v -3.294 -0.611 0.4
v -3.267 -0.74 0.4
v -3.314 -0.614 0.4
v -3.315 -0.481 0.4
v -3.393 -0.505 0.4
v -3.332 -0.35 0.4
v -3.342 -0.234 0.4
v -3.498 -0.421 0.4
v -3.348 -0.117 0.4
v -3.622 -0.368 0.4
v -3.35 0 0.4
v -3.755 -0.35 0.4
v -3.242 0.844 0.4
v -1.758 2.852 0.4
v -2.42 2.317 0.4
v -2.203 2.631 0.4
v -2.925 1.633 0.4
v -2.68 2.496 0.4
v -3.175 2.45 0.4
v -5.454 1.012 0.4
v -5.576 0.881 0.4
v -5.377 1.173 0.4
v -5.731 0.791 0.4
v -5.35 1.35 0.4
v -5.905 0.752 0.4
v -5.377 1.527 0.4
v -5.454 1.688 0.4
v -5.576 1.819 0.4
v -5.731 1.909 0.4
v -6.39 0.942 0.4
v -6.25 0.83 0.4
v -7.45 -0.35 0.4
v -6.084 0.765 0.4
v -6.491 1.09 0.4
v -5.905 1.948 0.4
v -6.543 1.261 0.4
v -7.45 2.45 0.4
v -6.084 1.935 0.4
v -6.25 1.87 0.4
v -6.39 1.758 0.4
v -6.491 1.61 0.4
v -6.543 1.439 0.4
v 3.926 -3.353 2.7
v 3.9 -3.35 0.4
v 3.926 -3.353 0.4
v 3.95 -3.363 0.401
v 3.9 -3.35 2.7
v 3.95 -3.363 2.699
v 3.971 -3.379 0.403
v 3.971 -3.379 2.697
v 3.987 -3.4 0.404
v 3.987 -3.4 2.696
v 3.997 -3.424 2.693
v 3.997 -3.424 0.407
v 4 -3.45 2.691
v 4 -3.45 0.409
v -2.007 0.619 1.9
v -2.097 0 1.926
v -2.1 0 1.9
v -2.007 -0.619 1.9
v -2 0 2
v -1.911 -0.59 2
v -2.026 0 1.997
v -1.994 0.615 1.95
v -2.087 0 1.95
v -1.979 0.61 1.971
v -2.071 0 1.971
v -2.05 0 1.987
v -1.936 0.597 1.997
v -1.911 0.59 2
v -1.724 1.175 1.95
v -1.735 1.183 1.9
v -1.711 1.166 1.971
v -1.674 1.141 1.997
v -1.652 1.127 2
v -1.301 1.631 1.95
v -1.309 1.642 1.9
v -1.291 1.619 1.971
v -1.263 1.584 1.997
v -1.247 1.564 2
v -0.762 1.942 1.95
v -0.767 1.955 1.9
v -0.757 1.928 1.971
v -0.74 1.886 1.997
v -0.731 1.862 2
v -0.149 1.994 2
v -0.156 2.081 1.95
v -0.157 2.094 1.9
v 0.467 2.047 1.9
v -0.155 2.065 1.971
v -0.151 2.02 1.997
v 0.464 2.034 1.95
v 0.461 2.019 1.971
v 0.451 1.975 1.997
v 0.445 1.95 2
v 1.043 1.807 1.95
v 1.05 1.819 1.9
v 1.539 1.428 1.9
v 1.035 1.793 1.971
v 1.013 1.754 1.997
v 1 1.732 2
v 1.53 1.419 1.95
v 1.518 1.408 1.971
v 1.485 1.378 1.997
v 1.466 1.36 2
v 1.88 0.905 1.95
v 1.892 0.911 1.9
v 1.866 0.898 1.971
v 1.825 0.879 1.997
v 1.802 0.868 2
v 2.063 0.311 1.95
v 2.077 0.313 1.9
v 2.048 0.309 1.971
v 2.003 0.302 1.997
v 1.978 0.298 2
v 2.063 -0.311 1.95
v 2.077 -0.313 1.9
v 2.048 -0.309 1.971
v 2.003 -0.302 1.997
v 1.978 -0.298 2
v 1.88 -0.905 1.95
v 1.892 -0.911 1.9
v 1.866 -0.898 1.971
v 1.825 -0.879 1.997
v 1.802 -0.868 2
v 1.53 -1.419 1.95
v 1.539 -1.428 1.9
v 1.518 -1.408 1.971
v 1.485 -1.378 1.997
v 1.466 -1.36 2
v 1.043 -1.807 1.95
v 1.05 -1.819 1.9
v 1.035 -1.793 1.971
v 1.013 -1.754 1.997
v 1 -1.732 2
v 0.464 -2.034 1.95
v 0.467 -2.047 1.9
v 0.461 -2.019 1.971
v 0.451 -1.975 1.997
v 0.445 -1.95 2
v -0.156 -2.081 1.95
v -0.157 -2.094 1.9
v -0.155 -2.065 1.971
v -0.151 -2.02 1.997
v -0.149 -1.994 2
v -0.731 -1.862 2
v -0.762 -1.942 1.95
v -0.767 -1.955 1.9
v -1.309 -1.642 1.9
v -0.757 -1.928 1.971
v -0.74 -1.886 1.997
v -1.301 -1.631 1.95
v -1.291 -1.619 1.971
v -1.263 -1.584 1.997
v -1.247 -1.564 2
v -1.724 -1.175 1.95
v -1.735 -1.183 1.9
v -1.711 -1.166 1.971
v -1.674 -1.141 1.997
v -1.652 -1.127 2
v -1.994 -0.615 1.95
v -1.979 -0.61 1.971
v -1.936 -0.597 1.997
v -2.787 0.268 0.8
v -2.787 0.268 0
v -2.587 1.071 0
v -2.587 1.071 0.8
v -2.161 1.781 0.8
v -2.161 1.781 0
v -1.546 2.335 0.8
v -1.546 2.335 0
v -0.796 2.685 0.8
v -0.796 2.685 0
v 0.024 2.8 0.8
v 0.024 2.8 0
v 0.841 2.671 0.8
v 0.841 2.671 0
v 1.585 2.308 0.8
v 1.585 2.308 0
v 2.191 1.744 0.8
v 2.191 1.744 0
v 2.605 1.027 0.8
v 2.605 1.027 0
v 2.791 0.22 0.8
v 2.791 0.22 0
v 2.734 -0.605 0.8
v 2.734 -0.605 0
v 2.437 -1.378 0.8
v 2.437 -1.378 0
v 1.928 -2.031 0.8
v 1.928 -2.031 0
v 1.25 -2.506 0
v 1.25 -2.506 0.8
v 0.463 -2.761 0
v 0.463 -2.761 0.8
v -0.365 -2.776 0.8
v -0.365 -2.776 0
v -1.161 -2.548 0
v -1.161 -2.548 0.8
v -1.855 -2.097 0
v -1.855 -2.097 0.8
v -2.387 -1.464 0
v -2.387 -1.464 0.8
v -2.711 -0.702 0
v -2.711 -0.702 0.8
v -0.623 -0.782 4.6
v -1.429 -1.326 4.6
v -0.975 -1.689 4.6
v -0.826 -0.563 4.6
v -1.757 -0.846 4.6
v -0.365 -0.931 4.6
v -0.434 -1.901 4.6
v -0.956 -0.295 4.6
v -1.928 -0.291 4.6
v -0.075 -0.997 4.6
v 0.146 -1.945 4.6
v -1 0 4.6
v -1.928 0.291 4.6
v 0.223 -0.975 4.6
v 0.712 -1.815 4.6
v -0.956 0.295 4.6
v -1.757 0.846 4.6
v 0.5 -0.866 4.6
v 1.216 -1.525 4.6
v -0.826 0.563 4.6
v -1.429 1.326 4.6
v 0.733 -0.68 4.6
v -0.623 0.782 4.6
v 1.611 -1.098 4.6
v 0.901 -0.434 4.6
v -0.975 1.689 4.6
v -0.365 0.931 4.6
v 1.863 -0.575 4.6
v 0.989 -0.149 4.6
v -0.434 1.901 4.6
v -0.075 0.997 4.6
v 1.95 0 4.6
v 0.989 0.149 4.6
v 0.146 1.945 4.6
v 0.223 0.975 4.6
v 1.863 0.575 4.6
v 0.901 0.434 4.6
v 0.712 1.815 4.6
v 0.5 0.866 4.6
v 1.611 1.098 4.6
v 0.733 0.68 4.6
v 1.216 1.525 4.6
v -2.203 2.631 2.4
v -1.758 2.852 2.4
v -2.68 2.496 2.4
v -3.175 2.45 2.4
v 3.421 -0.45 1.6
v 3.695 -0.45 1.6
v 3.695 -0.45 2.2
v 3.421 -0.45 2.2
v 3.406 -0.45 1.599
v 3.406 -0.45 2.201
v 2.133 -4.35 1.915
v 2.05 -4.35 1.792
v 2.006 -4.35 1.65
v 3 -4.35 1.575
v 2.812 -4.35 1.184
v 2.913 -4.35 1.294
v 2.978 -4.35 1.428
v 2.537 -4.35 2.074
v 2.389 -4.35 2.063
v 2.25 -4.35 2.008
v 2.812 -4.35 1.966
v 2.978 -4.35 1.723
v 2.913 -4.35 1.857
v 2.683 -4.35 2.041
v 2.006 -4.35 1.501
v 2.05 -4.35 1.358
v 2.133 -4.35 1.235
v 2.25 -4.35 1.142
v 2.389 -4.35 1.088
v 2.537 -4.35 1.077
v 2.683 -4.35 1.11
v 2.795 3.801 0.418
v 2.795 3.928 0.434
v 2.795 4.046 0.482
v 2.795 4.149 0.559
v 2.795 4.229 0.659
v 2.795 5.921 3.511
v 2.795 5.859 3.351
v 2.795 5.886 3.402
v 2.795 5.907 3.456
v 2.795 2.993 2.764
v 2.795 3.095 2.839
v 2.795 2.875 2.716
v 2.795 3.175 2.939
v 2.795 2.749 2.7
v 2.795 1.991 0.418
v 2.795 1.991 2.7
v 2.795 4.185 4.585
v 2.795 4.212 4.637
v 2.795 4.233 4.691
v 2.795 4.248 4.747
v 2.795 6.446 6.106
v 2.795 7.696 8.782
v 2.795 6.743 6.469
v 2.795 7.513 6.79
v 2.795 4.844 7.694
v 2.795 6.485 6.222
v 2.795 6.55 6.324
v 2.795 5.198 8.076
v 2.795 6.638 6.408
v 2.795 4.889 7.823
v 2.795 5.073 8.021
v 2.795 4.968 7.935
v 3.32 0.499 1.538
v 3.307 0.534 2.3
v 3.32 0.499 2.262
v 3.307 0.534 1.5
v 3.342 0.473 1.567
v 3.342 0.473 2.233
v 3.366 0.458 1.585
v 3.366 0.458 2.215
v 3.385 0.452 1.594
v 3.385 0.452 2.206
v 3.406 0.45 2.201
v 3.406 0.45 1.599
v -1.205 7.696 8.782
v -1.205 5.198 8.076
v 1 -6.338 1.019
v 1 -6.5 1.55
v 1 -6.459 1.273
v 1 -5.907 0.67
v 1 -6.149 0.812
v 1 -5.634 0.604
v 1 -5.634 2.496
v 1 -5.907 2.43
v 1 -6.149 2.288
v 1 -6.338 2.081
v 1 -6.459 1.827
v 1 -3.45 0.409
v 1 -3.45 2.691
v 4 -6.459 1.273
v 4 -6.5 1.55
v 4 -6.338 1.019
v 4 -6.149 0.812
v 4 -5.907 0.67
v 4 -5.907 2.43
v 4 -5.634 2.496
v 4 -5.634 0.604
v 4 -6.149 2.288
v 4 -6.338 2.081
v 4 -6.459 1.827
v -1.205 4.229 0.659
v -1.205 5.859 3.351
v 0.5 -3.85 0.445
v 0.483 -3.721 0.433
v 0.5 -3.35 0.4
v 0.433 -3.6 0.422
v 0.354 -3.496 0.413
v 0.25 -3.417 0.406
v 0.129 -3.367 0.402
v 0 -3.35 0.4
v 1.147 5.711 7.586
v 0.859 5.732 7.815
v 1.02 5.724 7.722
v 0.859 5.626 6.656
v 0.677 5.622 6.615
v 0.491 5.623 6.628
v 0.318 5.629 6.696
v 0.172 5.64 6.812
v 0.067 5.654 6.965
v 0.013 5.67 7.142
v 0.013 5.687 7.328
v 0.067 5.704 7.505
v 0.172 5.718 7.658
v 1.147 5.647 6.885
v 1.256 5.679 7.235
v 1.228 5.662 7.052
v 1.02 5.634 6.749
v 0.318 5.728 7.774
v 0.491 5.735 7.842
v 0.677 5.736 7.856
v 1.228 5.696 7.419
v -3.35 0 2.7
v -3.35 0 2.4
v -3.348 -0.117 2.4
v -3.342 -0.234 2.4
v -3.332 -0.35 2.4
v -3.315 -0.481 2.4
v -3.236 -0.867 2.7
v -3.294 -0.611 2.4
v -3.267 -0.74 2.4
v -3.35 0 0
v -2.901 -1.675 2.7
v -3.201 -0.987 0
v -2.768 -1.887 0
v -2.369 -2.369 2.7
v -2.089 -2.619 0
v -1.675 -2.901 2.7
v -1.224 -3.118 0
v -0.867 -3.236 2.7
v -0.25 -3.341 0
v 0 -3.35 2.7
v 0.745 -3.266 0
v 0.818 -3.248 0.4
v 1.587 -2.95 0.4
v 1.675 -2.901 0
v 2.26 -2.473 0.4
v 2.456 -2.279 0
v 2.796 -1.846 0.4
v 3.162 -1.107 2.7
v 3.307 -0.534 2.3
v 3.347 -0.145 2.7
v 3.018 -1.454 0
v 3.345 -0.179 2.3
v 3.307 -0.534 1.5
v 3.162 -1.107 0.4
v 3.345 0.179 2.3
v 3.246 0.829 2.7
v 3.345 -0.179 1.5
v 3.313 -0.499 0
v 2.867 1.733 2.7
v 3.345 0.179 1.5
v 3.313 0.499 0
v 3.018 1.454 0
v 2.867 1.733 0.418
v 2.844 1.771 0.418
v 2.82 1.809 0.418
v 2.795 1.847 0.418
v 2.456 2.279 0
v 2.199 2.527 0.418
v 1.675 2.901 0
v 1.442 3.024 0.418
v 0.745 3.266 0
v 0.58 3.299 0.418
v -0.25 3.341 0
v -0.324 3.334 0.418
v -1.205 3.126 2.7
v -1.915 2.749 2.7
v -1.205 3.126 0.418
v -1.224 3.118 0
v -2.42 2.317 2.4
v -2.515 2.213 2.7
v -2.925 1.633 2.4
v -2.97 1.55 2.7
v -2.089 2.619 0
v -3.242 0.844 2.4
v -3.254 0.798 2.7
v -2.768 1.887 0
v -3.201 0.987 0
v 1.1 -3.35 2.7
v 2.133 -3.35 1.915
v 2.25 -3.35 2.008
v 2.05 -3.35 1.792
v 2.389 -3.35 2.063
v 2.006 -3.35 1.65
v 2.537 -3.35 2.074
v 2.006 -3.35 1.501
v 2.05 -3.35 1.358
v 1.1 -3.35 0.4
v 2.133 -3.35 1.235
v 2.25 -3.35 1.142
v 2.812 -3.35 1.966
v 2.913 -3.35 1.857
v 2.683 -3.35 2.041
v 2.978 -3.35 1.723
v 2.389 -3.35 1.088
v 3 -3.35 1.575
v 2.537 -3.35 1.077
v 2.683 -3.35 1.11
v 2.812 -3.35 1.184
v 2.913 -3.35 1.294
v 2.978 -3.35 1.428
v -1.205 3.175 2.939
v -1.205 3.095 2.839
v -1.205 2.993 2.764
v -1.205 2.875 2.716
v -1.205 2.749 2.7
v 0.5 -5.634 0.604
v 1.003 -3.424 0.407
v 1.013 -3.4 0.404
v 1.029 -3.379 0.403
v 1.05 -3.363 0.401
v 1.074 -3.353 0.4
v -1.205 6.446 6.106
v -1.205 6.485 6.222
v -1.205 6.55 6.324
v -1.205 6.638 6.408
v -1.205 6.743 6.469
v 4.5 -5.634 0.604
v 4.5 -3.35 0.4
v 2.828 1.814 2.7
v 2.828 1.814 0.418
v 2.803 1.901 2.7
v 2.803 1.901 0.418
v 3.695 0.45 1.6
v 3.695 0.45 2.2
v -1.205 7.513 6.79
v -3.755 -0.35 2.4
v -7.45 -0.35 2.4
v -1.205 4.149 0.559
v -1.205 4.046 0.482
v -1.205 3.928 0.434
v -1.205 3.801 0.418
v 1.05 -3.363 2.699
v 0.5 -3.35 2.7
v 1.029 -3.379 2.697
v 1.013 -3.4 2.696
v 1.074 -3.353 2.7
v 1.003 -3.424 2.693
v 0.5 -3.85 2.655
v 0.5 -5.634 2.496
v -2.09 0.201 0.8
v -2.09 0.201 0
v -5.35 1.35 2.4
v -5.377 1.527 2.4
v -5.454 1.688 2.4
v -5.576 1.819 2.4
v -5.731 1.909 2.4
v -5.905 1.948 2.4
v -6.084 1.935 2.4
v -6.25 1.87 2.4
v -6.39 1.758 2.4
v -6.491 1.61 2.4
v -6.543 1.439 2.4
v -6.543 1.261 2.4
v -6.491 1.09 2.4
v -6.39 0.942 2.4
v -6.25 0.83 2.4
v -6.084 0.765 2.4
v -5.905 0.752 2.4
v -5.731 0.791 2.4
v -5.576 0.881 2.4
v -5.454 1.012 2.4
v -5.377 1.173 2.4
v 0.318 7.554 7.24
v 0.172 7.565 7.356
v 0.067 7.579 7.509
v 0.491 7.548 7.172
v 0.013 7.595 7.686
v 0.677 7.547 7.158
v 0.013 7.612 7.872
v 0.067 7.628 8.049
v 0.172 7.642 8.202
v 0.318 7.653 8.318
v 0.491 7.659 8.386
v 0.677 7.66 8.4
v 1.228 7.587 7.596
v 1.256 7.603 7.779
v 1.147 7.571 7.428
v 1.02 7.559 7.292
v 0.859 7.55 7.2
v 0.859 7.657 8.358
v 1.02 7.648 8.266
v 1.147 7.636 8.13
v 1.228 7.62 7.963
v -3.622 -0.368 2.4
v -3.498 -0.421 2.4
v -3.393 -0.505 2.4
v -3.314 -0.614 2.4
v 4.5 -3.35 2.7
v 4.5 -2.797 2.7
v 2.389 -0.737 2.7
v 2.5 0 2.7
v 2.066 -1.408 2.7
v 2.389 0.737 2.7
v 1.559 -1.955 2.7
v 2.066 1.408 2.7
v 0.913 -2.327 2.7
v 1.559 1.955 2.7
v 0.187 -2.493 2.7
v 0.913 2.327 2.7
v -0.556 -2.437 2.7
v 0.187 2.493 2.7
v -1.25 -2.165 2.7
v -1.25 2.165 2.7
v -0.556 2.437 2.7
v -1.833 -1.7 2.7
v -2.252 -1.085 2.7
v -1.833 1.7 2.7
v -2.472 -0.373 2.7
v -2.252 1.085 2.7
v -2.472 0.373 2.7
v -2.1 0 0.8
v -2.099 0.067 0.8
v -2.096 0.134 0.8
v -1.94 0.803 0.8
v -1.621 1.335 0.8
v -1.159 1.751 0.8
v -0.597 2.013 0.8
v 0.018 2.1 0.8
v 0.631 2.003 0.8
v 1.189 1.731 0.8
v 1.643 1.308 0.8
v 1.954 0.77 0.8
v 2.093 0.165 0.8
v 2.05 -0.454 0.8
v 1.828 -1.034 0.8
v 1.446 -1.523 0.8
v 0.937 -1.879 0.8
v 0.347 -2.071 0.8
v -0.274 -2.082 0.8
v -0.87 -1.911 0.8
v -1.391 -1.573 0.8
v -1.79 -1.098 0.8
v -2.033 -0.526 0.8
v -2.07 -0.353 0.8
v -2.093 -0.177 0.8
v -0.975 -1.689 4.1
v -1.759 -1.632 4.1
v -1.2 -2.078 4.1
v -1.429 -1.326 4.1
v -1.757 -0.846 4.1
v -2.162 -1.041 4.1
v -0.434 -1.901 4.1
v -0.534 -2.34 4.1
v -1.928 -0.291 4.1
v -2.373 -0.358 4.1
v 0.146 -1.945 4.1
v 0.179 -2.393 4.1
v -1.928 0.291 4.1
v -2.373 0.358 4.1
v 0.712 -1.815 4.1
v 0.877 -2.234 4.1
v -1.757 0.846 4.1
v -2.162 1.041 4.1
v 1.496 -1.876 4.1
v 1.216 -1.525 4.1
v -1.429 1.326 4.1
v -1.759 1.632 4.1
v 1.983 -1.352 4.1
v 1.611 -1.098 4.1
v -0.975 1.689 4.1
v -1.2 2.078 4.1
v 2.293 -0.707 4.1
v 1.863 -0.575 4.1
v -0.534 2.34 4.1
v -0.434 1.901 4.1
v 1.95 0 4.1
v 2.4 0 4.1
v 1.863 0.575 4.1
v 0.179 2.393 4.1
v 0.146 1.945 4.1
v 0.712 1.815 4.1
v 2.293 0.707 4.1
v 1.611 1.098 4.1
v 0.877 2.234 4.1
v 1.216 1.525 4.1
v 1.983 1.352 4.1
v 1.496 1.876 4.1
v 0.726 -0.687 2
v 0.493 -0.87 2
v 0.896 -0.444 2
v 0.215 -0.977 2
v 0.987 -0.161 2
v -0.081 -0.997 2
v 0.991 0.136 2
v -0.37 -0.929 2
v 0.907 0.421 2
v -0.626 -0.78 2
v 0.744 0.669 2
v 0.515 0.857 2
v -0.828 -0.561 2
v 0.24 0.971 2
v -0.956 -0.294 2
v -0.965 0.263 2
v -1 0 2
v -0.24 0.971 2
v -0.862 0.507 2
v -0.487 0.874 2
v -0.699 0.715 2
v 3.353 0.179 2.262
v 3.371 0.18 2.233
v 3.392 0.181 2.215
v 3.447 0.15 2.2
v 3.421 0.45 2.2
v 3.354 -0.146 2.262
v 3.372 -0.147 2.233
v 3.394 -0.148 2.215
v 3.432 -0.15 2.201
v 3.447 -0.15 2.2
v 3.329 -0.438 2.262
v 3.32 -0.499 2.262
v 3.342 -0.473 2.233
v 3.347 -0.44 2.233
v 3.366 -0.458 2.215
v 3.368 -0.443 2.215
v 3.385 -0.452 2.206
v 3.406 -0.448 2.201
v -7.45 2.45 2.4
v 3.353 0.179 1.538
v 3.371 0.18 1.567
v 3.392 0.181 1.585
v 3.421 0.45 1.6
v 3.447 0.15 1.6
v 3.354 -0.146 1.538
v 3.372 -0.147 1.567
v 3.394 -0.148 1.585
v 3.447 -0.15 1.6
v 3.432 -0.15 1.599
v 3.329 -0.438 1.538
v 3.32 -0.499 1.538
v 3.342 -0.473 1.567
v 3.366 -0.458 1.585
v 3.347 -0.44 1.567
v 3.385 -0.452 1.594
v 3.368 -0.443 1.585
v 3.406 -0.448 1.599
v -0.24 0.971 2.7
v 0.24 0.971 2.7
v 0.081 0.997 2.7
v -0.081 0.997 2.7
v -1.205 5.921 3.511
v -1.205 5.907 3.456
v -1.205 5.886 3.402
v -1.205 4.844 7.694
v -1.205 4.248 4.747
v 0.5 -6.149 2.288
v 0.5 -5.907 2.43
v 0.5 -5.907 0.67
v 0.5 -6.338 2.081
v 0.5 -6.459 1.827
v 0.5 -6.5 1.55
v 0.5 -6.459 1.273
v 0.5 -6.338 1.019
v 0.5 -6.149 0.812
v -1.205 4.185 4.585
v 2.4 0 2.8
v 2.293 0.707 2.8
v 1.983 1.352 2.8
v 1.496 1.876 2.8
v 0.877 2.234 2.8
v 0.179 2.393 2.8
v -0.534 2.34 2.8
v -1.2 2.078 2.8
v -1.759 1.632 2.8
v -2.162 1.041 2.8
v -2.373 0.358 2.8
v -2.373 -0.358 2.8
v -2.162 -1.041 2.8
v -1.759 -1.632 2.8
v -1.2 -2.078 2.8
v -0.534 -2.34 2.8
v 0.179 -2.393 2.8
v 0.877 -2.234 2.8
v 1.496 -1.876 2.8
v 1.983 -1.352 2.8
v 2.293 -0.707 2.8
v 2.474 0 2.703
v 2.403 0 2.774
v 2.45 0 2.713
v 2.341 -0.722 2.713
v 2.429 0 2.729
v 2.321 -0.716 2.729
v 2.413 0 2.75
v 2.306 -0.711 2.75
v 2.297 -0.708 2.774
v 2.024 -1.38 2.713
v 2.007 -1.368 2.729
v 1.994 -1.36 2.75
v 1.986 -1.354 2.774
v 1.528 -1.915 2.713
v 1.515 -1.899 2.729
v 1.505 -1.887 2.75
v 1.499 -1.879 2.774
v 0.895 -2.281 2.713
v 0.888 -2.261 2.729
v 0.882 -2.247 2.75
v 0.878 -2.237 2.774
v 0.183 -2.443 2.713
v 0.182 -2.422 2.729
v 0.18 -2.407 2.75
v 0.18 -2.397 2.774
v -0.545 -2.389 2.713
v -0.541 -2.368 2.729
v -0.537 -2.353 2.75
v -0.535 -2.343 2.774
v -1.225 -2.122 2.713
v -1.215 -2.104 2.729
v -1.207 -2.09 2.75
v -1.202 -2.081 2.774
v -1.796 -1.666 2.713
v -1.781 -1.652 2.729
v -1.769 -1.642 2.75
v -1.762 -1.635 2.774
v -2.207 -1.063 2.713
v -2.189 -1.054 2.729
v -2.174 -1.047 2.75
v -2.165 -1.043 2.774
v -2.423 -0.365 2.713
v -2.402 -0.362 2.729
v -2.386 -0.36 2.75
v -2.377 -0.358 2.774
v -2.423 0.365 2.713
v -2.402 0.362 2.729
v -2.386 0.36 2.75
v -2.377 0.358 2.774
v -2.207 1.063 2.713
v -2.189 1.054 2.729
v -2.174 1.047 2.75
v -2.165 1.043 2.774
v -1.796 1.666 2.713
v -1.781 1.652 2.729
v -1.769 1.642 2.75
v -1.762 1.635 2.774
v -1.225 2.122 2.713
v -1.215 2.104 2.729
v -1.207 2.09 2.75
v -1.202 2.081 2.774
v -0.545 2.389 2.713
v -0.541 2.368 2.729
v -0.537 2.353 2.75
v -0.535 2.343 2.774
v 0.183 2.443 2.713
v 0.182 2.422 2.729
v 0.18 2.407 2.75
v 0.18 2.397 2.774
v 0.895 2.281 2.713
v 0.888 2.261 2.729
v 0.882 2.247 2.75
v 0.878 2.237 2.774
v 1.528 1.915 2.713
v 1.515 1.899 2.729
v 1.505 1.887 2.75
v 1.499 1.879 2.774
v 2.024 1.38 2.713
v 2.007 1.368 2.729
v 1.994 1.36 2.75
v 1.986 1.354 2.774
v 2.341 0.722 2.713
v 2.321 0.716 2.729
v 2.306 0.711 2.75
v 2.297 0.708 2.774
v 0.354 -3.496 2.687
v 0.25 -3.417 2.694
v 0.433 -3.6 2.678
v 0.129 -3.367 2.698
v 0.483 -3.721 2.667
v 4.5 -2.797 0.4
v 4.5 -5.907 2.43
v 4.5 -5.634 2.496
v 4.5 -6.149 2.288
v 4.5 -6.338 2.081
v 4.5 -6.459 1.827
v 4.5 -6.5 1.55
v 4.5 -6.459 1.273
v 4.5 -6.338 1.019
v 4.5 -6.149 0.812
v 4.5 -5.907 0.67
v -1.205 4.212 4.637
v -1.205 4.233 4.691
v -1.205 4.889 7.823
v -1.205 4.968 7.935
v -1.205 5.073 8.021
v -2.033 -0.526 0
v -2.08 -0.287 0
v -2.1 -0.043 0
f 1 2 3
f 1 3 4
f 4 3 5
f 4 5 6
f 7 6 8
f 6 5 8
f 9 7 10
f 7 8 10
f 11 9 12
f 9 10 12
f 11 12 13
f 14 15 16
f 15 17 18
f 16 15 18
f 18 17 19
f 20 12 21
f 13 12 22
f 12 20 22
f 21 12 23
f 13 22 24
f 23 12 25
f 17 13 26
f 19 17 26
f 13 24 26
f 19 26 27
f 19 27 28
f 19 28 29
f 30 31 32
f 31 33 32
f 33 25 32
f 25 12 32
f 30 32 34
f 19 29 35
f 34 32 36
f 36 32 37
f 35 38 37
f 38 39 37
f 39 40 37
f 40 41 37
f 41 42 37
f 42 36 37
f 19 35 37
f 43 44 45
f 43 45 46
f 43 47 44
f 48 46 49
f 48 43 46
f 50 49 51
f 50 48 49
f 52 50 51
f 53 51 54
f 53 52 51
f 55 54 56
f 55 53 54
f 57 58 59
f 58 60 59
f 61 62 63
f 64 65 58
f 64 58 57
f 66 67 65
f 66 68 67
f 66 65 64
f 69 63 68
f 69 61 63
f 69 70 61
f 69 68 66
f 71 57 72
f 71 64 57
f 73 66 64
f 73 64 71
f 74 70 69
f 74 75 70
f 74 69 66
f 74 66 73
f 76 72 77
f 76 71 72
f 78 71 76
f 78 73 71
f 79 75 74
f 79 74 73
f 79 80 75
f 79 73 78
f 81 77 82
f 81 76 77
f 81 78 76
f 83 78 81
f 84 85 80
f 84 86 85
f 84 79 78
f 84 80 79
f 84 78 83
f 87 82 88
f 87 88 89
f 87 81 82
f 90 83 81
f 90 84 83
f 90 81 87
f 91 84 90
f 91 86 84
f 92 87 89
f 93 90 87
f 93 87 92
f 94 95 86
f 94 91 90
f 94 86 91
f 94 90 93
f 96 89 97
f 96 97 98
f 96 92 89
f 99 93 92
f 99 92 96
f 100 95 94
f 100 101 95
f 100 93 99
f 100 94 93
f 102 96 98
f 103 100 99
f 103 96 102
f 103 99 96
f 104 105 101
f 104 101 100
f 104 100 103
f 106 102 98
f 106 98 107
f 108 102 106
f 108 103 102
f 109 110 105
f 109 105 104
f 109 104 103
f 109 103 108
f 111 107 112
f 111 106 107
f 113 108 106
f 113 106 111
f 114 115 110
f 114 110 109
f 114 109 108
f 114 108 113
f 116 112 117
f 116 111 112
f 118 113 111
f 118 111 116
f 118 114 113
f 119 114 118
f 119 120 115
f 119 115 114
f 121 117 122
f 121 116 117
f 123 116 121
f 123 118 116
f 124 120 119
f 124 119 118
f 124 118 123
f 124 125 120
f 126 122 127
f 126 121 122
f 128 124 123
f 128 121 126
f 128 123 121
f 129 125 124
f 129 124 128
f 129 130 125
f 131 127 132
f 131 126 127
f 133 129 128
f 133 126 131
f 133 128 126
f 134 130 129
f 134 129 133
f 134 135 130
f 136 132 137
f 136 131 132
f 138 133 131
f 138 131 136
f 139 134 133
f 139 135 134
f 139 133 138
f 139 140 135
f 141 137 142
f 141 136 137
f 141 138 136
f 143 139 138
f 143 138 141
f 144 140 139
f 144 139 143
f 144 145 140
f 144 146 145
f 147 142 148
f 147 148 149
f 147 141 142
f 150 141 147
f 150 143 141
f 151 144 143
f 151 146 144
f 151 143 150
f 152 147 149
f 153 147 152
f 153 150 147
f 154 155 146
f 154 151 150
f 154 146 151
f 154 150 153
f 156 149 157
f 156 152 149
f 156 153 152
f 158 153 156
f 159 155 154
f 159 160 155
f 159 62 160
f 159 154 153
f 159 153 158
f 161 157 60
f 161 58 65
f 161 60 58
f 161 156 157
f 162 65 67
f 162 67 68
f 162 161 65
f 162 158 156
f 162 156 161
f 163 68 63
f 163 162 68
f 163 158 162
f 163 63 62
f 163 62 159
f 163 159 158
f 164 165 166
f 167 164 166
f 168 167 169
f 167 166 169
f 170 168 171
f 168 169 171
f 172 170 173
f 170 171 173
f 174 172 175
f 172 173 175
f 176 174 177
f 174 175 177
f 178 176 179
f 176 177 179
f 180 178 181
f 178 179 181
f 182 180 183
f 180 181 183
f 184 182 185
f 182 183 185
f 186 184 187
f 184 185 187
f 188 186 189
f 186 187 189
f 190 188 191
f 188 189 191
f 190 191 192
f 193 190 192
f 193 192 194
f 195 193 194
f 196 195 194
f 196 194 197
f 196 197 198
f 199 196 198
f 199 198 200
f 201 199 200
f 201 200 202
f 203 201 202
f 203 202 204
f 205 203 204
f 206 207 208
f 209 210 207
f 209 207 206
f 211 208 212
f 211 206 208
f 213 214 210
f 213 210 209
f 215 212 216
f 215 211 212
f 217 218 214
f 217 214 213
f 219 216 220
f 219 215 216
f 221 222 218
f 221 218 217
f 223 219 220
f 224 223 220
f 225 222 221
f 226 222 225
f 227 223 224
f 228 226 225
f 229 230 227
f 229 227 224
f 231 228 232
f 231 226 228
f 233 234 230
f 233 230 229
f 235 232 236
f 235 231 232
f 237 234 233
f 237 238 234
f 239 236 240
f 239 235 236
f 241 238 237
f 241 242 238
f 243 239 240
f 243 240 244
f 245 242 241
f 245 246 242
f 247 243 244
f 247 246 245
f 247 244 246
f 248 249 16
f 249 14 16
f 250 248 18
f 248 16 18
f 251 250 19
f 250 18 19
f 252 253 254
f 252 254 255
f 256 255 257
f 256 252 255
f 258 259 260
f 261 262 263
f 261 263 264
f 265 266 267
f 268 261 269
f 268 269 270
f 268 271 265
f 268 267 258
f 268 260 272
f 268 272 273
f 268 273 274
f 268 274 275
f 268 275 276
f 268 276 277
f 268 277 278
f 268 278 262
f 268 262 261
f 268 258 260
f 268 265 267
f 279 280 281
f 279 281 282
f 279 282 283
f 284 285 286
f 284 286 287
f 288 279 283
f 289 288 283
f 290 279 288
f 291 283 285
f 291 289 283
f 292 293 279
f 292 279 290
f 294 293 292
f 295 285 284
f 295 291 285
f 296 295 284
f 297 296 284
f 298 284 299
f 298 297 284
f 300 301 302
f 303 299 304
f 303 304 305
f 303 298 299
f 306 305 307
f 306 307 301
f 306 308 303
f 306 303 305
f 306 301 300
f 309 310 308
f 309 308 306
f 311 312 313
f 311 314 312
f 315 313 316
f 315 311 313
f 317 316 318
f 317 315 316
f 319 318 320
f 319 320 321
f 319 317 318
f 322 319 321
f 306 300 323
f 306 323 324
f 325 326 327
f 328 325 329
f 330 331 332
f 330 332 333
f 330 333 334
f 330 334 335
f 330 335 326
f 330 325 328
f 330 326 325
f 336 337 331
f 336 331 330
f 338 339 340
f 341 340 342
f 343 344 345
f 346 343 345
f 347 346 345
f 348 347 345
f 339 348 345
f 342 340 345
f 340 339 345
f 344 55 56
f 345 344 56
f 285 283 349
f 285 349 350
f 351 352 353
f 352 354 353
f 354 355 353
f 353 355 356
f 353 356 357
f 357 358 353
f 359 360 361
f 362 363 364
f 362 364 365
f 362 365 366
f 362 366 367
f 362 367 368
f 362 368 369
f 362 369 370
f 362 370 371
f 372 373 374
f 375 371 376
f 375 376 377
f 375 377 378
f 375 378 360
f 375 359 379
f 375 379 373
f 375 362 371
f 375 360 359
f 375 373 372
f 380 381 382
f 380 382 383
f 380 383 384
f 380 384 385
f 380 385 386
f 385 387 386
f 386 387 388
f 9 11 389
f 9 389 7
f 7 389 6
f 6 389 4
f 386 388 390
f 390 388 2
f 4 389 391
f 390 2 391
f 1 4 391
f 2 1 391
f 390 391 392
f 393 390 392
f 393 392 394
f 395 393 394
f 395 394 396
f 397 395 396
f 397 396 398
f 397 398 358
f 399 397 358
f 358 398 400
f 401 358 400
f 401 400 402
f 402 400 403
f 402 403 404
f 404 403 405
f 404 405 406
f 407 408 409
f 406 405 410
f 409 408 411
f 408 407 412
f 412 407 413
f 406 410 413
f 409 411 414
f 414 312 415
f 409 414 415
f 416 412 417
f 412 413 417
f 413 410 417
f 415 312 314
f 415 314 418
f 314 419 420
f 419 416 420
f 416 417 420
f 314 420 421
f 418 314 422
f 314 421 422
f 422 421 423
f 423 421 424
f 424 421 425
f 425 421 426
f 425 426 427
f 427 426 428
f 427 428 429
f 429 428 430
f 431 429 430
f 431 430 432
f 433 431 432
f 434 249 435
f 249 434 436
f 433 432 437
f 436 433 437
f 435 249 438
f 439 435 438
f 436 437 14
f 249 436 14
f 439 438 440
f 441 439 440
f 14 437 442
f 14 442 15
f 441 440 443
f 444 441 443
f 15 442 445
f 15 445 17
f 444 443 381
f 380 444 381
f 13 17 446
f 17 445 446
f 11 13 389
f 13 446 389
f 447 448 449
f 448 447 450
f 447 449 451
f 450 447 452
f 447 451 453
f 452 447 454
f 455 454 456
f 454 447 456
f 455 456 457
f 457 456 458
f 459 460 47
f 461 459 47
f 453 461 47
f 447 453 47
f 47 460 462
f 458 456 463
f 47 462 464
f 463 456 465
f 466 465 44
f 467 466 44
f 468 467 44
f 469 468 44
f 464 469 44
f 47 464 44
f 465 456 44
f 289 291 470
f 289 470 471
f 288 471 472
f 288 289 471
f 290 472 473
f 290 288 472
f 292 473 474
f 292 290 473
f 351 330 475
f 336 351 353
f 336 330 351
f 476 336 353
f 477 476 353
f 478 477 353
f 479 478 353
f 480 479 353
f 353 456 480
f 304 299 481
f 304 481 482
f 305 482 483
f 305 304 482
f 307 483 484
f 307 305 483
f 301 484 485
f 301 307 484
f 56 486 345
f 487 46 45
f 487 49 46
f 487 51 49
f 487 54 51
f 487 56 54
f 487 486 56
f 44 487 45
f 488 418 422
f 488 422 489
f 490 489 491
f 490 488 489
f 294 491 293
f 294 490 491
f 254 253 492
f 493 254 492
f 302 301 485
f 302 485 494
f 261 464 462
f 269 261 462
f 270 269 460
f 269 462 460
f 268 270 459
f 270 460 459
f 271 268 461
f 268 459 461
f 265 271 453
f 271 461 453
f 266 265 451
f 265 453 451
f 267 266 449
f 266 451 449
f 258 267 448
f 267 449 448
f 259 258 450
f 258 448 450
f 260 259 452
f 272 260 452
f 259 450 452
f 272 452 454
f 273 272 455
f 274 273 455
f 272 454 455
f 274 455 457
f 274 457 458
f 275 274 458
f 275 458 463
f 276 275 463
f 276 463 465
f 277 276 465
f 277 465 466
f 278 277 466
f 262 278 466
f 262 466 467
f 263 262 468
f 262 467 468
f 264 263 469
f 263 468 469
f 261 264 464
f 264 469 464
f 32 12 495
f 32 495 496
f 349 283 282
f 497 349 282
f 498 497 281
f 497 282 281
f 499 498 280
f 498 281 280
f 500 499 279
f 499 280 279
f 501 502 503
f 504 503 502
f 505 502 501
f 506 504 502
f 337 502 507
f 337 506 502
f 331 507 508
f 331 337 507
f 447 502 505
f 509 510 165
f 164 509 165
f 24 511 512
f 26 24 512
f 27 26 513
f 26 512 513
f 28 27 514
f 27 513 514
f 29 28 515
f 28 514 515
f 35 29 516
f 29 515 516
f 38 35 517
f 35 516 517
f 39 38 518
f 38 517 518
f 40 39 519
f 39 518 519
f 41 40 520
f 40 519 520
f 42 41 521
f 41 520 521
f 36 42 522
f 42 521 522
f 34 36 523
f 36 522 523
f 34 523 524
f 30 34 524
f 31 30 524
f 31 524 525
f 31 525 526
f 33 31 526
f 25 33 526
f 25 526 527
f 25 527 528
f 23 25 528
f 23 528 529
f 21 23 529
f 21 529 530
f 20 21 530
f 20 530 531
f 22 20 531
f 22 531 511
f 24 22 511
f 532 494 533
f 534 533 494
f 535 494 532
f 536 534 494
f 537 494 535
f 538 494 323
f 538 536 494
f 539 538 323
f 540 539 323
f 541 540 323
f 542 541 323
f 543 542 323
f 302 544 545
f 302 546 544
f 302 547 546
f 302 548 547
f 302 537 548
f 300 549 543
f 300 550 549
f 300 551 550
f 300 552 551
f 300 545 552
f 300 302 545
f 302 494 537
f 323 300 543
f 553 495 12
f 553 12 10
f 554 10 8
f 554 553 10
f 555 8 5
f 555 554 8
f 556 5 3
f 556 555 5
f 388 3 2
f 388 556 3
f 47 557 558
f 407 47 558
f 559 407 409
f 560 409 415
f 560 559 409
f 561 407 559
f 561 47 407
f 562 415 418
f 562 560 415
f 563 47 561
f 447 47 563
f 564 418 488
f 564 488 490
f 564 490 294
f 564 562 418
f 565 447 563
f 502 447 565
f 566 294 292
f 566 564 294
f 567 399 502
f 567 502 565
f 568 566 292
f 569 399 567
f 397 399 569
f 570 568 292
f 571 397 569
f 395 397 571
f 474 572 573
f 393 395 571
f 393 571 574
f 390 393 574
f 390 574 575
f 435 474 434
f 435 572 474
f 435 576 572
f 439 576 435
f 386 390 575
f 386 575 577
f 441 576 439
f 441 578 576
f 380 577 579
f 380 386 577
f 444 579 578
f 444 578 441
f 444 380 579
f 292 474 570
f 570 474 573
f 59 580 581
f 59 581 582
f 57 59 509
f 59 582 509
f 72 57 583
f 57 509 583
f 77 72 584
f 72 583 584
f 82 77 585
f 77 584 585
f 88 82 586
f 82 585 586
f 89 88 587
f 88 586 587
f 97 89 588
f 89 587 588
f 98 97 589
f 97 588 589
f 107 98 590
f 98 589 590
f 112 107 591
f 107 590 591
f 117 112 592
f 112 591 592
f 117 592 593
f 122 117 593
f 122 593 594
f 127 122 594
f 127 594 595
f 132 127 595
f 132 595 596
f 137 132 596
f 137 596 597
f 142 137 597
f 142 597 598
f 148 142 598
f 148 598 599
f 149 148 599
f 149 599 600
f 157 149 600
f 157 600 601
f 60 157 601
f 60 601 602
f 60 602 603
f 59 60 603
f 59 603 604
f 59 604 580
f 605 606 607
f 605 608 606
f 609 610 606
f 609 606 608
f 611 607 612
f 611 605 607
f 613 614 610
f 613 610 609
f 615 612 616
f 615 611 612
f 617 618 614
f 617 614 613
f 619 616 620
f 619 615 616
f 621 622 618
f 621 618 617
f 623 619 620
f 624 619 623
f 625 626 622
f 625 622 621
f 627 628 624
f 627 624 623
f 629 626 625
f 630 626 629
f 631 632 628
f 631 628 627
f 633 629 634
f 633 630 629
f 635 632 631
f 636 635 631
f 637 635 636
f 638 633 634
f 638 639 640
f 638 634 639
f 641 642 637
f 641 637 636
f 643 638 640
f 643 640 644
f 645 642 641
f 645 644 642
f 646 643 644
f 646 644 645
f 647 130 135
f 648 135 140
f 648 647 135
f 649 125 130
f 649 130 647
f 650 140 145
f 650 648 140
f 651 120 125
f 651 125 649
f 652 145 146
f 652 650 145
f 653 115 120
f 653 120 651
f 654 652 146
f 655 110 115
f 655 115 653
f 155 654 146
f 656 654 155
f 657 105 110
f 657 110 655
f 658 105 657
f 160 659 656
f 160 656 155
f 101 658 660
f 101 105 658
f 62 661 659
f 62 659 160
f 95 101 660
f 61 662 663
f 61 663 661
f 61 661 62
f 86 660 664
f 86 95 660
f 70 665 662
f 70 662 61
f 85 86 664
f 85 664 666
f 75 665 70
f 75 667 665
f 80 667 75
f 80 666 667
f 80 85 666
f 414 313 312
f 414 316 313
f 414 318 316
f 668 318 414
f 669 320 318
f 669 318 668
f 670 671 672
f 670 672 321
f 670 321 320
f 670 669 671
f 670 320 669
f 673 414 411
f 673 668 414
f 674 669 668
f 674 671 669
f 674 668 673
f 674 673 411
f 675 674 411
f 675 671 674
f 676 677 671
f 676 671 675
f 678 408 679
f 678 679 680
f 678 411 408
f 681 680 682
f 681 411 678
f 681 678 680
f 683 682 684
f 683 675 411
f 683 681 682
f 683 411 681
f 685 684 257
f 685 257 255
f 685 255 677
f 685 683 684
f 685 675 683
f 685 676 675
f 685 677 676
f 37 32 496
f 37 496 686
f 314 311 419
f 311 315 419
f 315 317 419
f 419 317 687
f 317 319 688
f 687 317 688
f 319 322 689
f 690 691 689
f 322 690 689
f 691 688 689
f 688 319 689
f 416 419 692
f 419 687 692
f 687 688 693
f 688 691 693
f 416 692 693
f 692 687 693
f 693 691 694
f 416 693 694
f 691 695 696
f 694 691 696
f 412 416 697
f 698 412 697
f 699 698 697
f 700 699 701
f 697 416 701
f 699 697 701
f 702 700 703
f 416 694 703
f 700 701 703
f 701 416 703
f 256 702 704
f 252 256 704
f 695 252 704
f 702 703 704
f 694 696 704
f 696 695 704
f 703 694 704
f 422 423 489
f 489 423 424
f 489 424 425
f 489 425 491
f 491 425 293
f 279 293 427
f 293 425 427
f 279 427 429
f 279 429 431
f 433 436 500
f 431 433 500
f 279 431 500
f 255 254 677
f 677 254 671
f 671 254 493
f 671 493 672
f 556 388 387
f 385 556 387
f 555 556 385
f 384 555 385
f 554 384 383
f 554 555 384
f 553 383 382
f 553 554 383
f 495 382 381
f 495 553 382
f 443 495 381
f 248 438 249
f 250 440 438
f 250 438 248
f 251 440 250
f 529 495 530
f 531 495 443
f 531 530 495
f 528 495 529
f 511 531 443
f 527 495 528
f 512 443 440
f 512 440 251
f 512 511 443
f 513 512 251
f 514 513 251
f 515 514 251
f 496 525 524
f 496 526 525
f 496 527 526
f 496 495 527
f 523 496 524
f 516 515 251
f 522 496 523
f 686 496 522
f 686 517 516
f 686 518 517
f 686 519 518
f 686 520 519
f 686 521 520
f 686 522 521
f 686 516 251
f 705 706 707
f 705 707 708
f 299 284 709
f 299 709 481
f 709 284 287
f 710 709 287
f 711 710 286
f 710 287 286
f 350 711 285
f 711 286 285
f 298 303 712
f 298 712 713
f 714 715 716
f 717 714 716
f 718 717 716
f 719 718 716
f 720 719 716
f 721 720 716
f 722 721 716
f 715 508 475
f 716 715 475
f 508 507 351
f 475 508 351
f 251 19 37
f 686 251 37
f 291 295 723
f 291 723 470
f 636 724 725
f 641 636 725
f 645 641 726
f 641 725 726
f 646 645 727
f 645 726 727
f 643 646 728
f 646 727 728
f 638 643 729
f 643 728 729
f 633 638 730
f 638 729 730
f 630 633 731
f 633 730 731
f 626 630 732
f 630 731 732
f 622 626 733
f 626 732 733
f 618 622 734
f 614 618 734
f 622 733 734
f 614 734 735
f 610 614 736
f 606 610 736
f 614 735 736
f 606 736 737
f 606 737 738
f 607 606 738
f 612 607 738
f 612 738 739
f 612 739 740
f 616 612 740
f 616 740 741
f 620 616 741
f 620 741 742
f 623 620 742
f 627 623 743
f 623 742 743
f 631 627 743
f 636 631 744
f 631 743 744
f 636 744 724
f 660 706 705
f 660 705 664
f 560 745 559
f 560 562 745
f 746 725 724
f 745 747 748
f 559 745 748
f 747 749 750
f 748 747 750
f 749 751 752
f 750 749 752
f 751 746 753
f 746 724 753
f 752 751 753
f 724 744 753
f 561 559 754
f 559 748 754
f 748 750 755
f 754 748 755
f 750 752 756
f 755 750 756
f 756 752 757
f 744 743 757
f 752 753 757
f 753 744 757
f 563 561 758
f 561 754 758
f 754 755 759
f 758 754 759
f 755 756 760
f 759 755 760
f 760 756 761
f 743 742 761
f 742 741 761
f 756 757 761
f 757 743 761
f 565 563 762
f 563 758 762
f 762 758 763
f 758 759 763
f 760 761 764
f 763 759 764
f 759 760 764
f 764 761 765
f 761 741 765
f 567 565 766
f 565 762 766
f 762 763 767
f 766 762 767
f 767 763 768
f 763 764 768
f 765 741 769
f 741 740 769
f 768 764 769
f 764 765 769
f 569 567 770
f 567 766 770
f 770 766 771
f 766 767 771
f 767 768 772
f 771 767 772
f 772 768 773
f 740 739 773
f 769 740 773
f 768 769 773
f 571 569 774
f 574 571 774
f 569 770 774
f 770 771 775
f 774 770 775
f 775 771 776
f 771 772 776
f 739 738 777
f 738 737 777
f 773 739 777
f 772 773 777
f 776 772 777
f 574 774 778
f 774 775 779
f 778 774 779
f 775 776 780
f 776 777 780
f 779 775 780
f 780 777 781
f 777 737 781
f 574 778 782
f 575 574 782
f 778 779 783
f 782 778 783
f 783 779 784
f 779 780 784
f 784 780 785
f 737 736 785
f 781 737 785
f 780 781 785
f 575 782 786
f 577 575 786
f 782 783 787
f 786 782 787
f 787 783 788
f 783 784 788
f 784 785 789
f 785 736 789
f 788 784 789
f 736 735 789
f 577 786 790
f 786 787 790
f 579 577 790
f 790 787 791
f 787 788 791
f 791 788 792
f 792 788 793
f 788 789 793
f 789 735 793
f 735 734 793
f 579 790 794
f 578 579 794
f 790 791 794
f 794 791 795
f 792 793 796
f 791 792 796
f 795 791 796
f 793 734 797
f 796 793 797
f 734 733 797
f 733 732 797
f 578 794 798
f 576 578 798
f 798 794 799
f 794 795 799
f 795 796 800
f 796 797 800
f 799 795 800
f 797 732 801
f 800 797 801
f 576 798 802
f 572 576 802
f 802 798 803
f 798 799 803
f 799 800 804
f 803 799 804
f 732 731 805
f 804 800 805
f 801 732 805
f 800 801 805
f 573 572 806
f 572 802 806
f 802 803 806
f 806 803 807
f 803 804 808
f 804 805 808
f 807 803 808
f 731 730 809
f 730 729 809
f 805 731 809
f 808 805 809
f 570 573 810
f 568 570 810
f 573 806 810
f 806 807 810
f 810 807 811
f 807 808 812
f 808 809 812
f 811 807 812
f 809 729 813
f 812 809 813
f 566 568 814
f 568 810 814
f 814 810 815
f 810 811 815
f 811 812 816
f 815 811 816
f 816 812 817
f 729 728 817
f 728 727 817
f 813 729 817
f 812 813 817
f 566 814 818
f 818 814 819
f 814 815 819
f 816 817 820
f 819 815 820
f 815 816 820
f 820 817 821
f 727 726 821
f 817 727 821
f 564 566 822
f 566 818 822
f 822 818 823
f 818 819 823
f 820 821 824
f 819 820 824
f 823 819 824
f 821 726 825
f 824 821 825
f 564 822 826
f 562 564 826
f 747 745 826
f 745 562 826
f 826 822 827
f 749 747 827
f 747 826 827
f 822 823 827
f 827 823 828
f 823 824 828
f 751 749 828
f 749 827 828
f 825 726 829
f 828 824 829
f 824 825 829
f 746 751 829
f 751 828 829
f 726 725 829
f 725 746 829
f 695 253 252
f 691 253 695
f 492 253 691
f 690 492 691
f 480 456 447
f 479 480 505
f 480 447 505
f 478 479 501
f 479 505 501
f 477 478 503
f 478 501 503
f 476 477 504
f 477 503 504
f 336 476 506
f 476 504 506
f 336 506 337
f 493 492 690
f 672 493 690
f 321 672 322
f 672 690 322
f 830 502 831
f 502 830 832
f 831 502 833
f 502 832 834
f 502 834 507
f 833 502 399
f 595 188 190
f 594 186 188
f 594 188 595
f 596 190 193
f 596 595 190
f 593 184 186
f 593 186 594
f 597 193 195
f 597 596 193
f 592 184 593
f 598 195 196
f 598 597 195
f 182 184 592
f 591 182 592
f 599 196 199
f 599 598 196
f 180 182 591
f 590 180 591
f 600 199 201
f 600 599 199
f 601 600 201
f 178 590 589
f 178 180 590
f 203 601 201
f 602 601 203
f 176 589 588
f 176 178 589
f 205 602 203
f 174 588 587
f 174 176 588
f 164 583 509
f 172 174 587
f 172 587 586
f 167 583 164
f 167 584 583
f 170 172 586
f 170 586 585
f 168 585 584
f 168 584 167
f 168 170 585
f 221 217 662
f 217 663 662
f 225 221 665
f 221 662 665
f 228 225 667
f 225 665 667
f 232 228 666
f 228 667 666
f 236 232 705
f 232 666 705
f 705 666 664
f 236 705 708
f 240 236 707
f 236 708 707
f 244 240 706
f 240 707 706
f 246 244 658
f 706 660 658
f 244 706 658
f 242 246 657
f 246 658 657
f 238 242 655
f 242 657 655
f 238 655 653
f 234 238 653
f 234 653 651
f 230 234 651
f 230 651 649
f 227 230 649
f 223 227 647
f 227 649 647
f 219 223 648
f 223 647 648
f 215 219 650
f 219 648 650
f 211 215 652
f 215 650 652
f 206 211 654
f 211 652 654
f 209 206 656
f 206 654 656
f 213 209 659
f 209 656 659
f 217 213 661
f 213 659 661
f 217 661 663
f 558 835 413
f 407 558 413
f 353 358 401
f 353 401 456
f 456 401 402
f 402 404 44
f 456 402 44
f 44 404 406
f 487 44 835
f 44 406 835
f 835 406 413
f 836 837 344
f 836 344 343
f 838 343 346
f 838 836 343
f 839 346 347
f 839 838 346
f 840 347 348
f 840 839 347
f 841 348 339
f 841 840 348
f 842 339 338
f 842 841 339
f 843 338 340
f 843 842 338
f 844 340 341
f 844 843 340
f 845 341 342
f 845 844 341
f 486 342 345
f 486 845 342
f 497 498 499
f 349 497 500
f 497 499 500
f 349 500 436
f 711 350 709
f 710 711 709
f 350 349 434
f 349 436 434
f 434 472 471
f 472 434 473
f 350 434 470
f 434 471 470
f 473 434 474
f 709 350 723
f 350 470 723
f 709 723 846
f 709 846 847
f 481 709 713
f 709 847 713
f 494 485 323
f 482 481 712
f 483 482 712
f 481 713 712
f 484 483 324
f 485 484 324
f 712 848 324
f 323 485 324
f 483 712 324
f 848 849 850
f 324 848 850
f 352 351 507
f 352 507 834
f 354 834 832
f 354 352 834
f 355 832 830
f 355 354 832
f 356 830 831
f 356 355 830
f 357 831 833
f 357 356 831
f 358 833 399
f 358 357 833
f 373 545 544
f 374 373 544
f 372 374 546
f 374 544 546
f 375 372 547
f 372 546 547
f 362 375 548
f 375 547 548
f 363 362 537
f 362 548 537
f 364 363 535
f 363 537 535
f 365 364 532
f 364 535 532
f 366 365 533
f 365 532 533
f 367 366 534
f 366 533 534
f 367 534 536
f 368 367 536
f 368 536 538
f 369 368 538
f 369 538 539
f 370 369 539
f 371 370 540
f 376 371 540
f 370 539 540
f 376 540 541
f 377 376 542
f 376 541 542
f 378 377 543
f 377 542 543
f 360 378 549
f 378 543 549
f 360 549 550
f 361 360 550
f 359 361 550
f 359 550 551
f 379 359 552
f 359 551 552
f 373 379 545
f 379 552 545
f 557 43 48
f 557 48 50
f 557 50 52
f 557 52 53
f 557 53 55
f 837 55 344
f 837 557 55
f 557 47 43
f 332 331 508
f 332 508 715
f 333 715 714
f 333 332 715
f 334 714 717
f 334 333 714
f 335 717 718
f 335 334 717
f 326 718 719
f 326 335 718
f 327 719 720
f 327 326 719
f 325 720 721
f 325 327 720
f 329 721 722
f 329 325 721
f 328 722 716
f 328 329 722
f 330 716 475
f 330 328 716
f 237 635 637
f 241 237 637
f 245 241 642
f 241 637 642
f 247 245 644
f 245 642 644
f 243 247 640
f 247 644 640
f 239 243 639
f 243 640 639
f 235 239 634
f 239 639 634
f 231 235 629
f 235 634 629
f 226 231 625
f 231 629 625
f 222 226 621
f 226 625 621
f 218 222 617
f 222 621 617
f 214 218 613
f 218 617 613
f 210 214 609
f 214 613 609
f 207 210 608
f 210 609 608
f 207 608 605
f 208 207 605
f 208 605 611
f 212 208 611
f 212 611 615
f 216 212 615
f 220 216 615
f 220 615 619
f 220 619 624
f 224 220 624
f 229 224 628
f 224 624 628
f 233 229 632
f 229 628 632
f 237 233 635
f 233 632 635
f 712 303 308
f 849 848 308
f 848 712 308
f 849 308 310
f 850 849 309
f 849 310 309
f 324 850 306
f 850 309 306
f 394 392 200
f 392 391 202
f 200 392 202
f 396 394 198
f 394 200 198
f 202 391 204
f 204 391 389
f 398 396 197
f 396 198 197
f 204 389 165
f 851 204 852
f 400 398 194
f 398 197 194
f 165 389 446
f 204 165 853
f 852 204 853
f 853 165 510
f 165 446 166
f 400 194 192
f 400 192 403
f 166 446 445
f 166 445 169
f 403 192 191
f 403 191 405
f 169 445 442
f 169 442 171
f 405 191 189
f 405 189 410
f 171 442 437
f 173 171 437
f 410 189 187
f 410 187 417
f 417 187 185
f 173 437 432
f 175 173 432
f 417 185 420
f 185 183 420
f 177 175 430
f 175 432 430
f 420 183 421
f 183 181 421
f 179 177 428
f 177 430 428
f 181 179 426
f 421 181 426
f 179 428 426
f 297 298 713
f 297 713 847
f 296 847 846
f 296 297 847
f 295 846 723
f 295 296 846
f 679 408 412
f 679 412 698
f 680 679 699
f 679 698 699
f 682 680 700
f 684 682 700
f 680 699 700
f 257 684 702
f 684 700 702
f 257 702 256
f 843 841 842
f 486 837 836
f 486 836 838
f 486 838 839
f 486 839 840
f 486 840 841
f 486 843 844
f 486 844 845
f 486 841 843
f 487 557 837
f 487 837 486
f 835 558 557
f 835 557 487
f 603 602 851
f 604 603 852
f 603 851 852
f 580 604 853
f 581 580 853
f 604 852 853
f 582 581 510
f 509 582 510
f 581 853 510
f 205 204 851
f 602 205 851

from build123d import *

# Parameters (mm, degrees)
SKETCH1_R                 = 3.35
BOSS_EXTRUDE1_DEPTH       = 2.7
SKETCH2_R                 = 2.4
BOSS_EXTRUDE2_DEPTH       = 1.4
SKETCH3_R                 = 1.95
BOSS_EXTRUDE3_DEPTH       = 0.5
F_2_0MM_DOWEL_HOLE1_D     = 2
F_2_0MM_DOWEL_HOLE1_DEPTH = 52.32
F_2_0MM_DOWEL_HOLE1_TIP   = 0.600860619
SKETCH7_W                 = 5.275172559
SKETCH7_H                 = 2.8
BOSS_EXTRUDE4_DEPTH       = 2
F_2_0MM_DOWEL_HOLE2_D     = 1.2
F_2_0MM_DOWEL_HOLE2_DEPTH = 52.32
F_2_0MM_DOWEL_HOLE2_TIP   = 0.360516371
BOSS_EXTRUDE5_DEPTH       = 2.3
BOSS_EXTRUDE6_DEPTH       = 0.5
LPATTERN1_COUNT           = 2
LPATTERN1_PITCH           = 3.5
SKETCH12_R                = 0.5
BOSS_EXTRUDE7_DEPTH       = 1
SKETCH13_W                = 0.512018779
SKETCH13_H                = 0.9
BOSS_EXTRUDE8_DEPTH       = 0.6
BOSS_EXTRUDE9_DEPTH       = 4
SKETCH6_R                 = 2.1
CUT_EXTRUDE1_DEPTH        = 2
SKETCH17_R                = 0.625
CUT_EXTRUDE2_DEPTH        = 2
FILLET1_R                 = 0.1
FILLET2_R                 = 2.7
FILLET3_R                 = 0.5
SKETCH18_R                = 2.8
CUT_EXTRUDE3_DEPTH        = 0.8
BOSS_EXTRUDE10_START      = 0.8
BOSS_EXTRUDE10_DEPTH      = 0.8


with BuildPart() as part:
    # Sketch1 → Boss-Extrude1 (new body)
    with BuildSketch(Plane.XY):
        with Locations(Location((0, 0, 0), (0, 0, 180))):
            Circle(SKETCH1_R)
    extrude(amount=BOSS_EXTRUDE1_DEPTH)

    # Sketch2 → Boss-Extrude2 (add)
    with BuildSketch(Plane.XY.offset(2.7)):
        Circle(SKETCH2_R)
    extrude(amount=BOSS_EXTRUDE2_DEPTH)

    # Sketch3 → Boss-Extrude3 (add)
    with BuildSketch(Plane.XY.offset(4.1)):
        Circle(SKETCH3_R)
    extrude(amount=BOSS_EXTRUDE3_DEPTH)

    # Ø2.0mm Dowel Hole1
    with Locations(Plane.XY.offset(4.6)):
        with Locations((0, 0)):
            Hole(F_2_0MM_DOWEL_HOLE1_D / 2, depth=F_2_0MM_DOWEL_HOLE1_DEPTH)
            with Locations((0, 0, -(F_2_0MM_DOWEL_HOLE1_DEPTH + F_2_0MM_DOWEL_HOLE1_TIP / 2))):  # 118° drill point
                Cone(0, F_2_0MM_DOWEL_HOLE1_D / 2, F_2_0MM_DOWEL_HOLE1_TIP, mode=Mode.SUBTRACT)

    # Sketch7 → Boss-Extrude4 (add)
    with BuildSketch(Plane(origin=(0, 0, 0.4), x_dir=(-1, 0, 0), z_dir=(0, 0, -1))):
        with Locations((4.812413721, 1.05)):
            Rectangle(SKETCH7_W, SKETCH7_H)
    extrude(amount=-BOSS_EXTRUDE4_DEPTH)

    # Ø2.0mm Dowel Hole2
    with Locations(Plane(origin=(0, 0, 0.4), x_dir=(-1, 0, 0), z_dir=(0, 0, -1))):
        with Locations((5.95, 1.35)):
            Hole(F_2_0MM_DOWEL_HOLE2_D / 2, depth=F_2_0MM_DOWEL_HOLE2_DEPTH)
            with Locations((0, 0, -(F_2_0MM_DOWEL_HOLE2_DEPTH + F_2_0MM_DOWEL_HOLE2_TIP / 2))):  # 118° drill point
                Cone(0, F_2_0MM_DOWEL_HOLE2_D / 2, F_2_0MM_DOWEL_HOLE2_TIP, mode=Mode.SUBTRACT)

    # Sketch10 → Boss-Extrude5 (add)
    with BuildSketch(Plane(origin=(0, 0, 0.4), x_dir=(-1, 0, 0), z_dir=(0, 0, -1))):
        with BuildLine():
            Line((0, -3.35), (-4.5, -3.35))
            Line((-4.5, -3.35), (-4.5, -2.796712357))
            Line((-4.5, -2.796712357), (-3.161899091, -1.106749357))
            ThreePointArc((-3.161899091, -1.106749357), (-1.938412966, -2.732225315), (0, -3.35))
        make_face()
    extrude(amount=-BOSS_EXTRUDE5_DEPTH)

    # Sketch11 → Boss-Extrude6 (add)
    with BuildSketch(Plane(origin=(4.5, 0, 0), x_dir=(0, 0, -1), z_dir=(1, 0, 0))):
        with BuildLine():
            Line((-2.7, -3.35), (-2.496243438, -5.634399979))
            ThreePointArc((-2.496243438, -5.634399979), (-1.55, -6.5), (-0.603756562, -5.634399979))
            Line((-0.603756562, -5.634399979), (-0.4, -3.35))
            Line((-0.4, -3.35), (-2.7, -3.35))
        make_face()
    boss_extrude6 = extrude(amount=-BOSS_EXTRUDE6_DEPTH)

    # LPattern1: Boss-Extrude6 ×2
    with Locations(*[(-i * LPATTERN1_PITCH, 0, 0) for i in range(1, LPATTERN1_COUNT)]):
        add(boss_extrude6)

    # Sketch12 → Boss-Extrude7 (add)
    with BuildSketch(Plane.XZ.offset(3.35)):
        with Locations((2.5, 1.575371986)):
            Circle(SKETCH12_R)
    extrude(amount=BOSS_EXTRUDE7_DEPTH)

    # Sketch13 → Boss-Extrude8 (add)
    with BuildSketch(Plane(origin=(0, 0, 1.6), x_dir=(-1, 0, 0), z_dir=(0, 0, -1))):
        with Locations((-3.439131456, 0)):
            Rectangle(SKETCH13_W, SKETCH13_H)
    extrude(amount=-BOSS_EXTRUDE8_DEPTH)

    # Sketch14 → Boss-Extrude9 (add)
    with BuildSketch(Plane(origin=(2.795140845, 0, 0), x_dir=(0, 0, -1), z_dir=(1, 0, 0))):
        Polygon((-0.417568245, 0.970740329), (-0.417568245, 4.082645212), (-3.42580183, 5.903958571), (-6.366262564, 6.498677554), (-6.790223471, 7.512753785), (-8.781855644, 7.695513983), (-7.993219009, 4.904805783), (-4.660696843, 4.230790935), (-2.7, 3.028431634), (-2.7, 0.970740329), align=None)
    extrude(amount=-BOSS_EXTRUDE9_DEPTH)

    # Sketch6 → Cut-Extrude1 (cut)
    with BuildSketch(Plane(origin=(0, 0, 0), x_dir=(-1, 0, 0), z_dir=(0, 0, -1))):
        Circle(SKETCH6_R)
    extrude(amount=-CUT_EXTRUDE1_DEPTH, mode=Mode.SUBTRACT)

    # Sketch17 → Cut-Extrude2 (cut, along a direction that is not the sketch's normal)
    with BuildSketch(Plane(origin=(0, 6.832124657, -0.626943304), x_dir=(1, 0, 0), z_dir=(0, 0.9958160861843439, -0.09138009901775918))):
        with Locations((0.630573116, -8.441313195)):
            Circle(SKETCH17_R)
    extrude(amount=-CUT_EXTRUDE2_DEPTH, dir=(0, 0.962313172469087, 0.2719436671306786), mode=Mode.SUBTRACT)

    # Fillet1
    fillet1_edges = [part.edges().sort_by_distance(p)[0] for p in [
        (2.1, 0, 2),
        (-2.4, 0, 2.7),
        (4, -3.35, 1.55),
        (1, -3.35, 1.55),
        (3.35, 0, 1.6),
        (3.319638535, -0.45, 1.9),
        (3.319638535, 0.45, 1.9),
        (3.35, 0, 2.2),
    ]]
    fillet(fillet1_edges, radius=FILLET1_R)

    # Fillet2
    fillet2_edges = [part.edges().sort_by_distance(p)[0] for p in [
        (-2.284731932, 2.45, 1.4),
    ]]
    fillet(fillet2_edges, radius=FILLET2_R)

    # Fillet3
    # the kernel refuses this fillet: 0.5 mm, written as the material it adds along each edge
    with BuildSketch(Plane(origin=(2.795140845, 3.028431634, 2.7), x_dir=(0, 0.522764913438525, 0.8524768884125898), z_dir=(-1, 0, 0))) as fillet3_piece_1:
        with BuildLine():
            CenterArc((FILLET3_R * 0.559821730124, -FILLET3_R), FILLET3_R, 90, 58.482100164)
            Line((-FILLET3_R * 0.292655158289, -FILLET3_R * 0.477235086561), (0, 0))
            Line((0, 0), (FILLET3_R * 0.559821730124, 0))
        make_face()
    extrude(amount=4)
    with BuildSketch(Plane(origin=(2.795140845, 4.230790935, 4.660696843), x_dir=(0, 0.19823966114604022, 0.9801535781441106), z_dir=(-1, 0, 0))) as fillet3_piece_2:
        with BuildLine():
            CenterArc((FILLET3_R * 0.177081663879, -FILLET3_R), FILLET3_R, 90, 20.083861782)
            Line((-FILLET3_R * 0.166313507063, -FILLET3_R * 0.0608089882382), (0, 0))
            Line((0, 0), (FILLET3_R * 0.177081663879, 0))
        make_face()
    extrude(amount=4)
    with BuildSketch(Plane(origin=(2.795140845, 6.498677554, 6.366262564), x_dir=(0, -0.1982396611460371, -0.9801535781441113), z_dir=(-1, 0, 0))) as fillet3_piece_3:
        with BuildLine():
            CenterArc((FILLET3_R * 0.530337057694, -FILLET3_R), FILLET3_R, 90, 55.877328997)
            Line((-FILLET3_R * 0.297501376428, -FILLET3_R * 0.439033399398), (0, 0))
            Line((0, 0), (FILLET3_R * 0.530337057694, 0))
        make_face()
    extrude(amount=4)
    with BuildSketch(Plane(origin=(2.795140845, 1.846533958, 2.7), x_dir=(0.534296962872843, -0.845296844584703, 0), z_dir=(0, 0, -1))) as fillet3_piece_4:
        with BuildLine():
            CenterArc((0.144932912, -0.49989869), FILLET3_R, 91.153417374, 31.142828348)
            Line((-0.122215569, -0.077250268), (0, 0))
            ThreePointArc((0, 0), (0.067434063, -0.000678778), (0.134868127, 0))
        make_face()
    extrude(amount=2.282431755)
    with BuildSketch(Plane(origin=(-3.33166625, -0.35, 2.4), x_dir=(0.16291161628339781, -0.9866406667474896, 0), z_dir=(0, 0, -1))) as fillet3_piece_5:
        with BuildLine():
            CenterArc((0.42435489, 0.499130817), FILLET3_R, 189.375937442, 77.245195509)
            Line((-0.068965443, 0.417675009), (0, 0))
            ThreePointArc((0, 0), (0.1974429, 0.005823524), (0.394885801, 0))
        make_face()
    extrude(amount=2)
    with BuildSketch(Plane(origin=(0.5, -3.35, 0.4), x_dir=(0, -1, 0), z_dir=(0, 0, 1))) as fillet3_piece_6_section:
        with BuildLine():
            CenterArc((FILLET3_R, -FILLET3_R), FILLET3_R, 90, 90)
            Line((0, -FILLET3_R), (0, 0))
            Line((0, 0), (FILLET3_R, 0))
        make_face()
    fillet3_piece_6 = extrude(amount=2.3, mode=Mode.PRIVATE)
    fillet3_piece_6 = split(fillet3_piece_6, bisect_by=Plane(origin=(0.386269446, -3.56317019, 2.680986331), z_dir=(0, 0.08884208299737703, -0.9960457239949817)), keep=Keep.TOP, mode=Mode.PRIVATE)
    fillet3_piece_6 = split(fillet3_piece_6, bisect_by=Plane(origin=(0.386269446, -3.56317019, 0.419013669), z_dir=(0, 0.08884208299737684, 0.9960457239949817)), keep=Keep.TOP, mode=Mode.PRIVATE)
    add(fillet3_piece_6)
    # the kernel refuses this fillet: 0.5 mm, written as the material it takes off along each edge
    with BuildSketch(Plane(origin=(3.499587338, 4.082645212, 0.417568245), x_dir=(0, 0.5179151427951786, 0.8554319989709583), z_dir=(-1, 0, 0))) as fillet3_2_piece_1:
        with BuildLine():
            CenterArc((FILLET3_R * 0.563557194242, -FILLET3_R), FILLET3_R, 90, 58.807492982)
            Line((-FILLET3_R * 0.291874804729, -FILLET3_R * 0.482084857205), (0, 0))
            Line((0, 0), (FILLET3_R * 0.563557194242, 0))
        make_face()
    extrude(amount=5.408892986, mode=Mode.SUBTRACT)
    with BuildSketch(Plane(origin=(3.557934544, 4.904805783, 7.993219009), x_dir=(0, -0.19823966114603667, -0.9801535781441112), z_dir=(-1, 0, 0))) as fillet3_2_piece_2:
        with BuildLine():
            CenterArc((FILLET3_R * 0.610234959151, -FILLET3_R), FILLET3_R, 90, 62.786002784)
            Line((-FILLET3_R * 0.279069719717, -FILLET3_R * 0.542684804382), (0, 0))
            Line((0, 0), (FILLET3_R * 0.610234959151, 0))
        make_face()
    extrude(amount=5.525587398, mode=Mode.SUBTRACT)
    with BuildSketch(Plane(origin=(3.012833965, 5.903958571, 3.42580183), x_dir=(0, 0.19823966114603944, 0.9801535781441109), z_dir=(-1, 0, 0))) as fillet3_2_piece_3:
        with BuildLine():
            CenterArc((FILLET3_R * 0.174154496328, -FILLET3_R), FILLET3_R, 90, 19.758468965)
            Line((-FILLET3_R * 0.163901334448, -FILLET3_R * 0.0588739429395), (0, 0))
            Line((0, 0), (FILLET3_R * 0.174154496328, 0))
        make_face()
    extrude(amount=4.435386241, mode=Mode.SUBTRACT)

    # Sketch18 → Cut-Extrude3 (cut)
    with BuildSketch(Plane(origin=(0, 0, 0), x_dir=(-1, 0, 0), z_dir=(0, 0, -1))):
        Circle(SKETCH18_R)
    extrude(amount=-CUT_EXTRUDE3_DEPTH, mode=Mode.SUBTRACT)

    # Sketch19 → Boss-Extrude10 (add)
    with BuildSketch(Plane(origin=(0, 0, 0.8), x_dir=(-1, 0, 0), z_dir=(0, 0, -1)).offset(BOSS_EXTRUDE10_START)):
        with BuildLine():
            Line((2.090376166, 0.200817044), (2.787168221, 0.267756059))
            ThreePointArc((2.787168221, 0.267756059), (2.791320225, -0.22029844), (2.710659376, -0.701659282))
            Line((2.710659376, -0.701659282), (2.032994532, -0.526244462))
            ThreePointArc((2.032994532, -0.526244462), (2.093490169, -0.16522383), (2.090376166, 0.200817044))
        make_face()
    extrude(amount=-BOSS_EXTRUDE10_DEPTH)


solid = part.part
